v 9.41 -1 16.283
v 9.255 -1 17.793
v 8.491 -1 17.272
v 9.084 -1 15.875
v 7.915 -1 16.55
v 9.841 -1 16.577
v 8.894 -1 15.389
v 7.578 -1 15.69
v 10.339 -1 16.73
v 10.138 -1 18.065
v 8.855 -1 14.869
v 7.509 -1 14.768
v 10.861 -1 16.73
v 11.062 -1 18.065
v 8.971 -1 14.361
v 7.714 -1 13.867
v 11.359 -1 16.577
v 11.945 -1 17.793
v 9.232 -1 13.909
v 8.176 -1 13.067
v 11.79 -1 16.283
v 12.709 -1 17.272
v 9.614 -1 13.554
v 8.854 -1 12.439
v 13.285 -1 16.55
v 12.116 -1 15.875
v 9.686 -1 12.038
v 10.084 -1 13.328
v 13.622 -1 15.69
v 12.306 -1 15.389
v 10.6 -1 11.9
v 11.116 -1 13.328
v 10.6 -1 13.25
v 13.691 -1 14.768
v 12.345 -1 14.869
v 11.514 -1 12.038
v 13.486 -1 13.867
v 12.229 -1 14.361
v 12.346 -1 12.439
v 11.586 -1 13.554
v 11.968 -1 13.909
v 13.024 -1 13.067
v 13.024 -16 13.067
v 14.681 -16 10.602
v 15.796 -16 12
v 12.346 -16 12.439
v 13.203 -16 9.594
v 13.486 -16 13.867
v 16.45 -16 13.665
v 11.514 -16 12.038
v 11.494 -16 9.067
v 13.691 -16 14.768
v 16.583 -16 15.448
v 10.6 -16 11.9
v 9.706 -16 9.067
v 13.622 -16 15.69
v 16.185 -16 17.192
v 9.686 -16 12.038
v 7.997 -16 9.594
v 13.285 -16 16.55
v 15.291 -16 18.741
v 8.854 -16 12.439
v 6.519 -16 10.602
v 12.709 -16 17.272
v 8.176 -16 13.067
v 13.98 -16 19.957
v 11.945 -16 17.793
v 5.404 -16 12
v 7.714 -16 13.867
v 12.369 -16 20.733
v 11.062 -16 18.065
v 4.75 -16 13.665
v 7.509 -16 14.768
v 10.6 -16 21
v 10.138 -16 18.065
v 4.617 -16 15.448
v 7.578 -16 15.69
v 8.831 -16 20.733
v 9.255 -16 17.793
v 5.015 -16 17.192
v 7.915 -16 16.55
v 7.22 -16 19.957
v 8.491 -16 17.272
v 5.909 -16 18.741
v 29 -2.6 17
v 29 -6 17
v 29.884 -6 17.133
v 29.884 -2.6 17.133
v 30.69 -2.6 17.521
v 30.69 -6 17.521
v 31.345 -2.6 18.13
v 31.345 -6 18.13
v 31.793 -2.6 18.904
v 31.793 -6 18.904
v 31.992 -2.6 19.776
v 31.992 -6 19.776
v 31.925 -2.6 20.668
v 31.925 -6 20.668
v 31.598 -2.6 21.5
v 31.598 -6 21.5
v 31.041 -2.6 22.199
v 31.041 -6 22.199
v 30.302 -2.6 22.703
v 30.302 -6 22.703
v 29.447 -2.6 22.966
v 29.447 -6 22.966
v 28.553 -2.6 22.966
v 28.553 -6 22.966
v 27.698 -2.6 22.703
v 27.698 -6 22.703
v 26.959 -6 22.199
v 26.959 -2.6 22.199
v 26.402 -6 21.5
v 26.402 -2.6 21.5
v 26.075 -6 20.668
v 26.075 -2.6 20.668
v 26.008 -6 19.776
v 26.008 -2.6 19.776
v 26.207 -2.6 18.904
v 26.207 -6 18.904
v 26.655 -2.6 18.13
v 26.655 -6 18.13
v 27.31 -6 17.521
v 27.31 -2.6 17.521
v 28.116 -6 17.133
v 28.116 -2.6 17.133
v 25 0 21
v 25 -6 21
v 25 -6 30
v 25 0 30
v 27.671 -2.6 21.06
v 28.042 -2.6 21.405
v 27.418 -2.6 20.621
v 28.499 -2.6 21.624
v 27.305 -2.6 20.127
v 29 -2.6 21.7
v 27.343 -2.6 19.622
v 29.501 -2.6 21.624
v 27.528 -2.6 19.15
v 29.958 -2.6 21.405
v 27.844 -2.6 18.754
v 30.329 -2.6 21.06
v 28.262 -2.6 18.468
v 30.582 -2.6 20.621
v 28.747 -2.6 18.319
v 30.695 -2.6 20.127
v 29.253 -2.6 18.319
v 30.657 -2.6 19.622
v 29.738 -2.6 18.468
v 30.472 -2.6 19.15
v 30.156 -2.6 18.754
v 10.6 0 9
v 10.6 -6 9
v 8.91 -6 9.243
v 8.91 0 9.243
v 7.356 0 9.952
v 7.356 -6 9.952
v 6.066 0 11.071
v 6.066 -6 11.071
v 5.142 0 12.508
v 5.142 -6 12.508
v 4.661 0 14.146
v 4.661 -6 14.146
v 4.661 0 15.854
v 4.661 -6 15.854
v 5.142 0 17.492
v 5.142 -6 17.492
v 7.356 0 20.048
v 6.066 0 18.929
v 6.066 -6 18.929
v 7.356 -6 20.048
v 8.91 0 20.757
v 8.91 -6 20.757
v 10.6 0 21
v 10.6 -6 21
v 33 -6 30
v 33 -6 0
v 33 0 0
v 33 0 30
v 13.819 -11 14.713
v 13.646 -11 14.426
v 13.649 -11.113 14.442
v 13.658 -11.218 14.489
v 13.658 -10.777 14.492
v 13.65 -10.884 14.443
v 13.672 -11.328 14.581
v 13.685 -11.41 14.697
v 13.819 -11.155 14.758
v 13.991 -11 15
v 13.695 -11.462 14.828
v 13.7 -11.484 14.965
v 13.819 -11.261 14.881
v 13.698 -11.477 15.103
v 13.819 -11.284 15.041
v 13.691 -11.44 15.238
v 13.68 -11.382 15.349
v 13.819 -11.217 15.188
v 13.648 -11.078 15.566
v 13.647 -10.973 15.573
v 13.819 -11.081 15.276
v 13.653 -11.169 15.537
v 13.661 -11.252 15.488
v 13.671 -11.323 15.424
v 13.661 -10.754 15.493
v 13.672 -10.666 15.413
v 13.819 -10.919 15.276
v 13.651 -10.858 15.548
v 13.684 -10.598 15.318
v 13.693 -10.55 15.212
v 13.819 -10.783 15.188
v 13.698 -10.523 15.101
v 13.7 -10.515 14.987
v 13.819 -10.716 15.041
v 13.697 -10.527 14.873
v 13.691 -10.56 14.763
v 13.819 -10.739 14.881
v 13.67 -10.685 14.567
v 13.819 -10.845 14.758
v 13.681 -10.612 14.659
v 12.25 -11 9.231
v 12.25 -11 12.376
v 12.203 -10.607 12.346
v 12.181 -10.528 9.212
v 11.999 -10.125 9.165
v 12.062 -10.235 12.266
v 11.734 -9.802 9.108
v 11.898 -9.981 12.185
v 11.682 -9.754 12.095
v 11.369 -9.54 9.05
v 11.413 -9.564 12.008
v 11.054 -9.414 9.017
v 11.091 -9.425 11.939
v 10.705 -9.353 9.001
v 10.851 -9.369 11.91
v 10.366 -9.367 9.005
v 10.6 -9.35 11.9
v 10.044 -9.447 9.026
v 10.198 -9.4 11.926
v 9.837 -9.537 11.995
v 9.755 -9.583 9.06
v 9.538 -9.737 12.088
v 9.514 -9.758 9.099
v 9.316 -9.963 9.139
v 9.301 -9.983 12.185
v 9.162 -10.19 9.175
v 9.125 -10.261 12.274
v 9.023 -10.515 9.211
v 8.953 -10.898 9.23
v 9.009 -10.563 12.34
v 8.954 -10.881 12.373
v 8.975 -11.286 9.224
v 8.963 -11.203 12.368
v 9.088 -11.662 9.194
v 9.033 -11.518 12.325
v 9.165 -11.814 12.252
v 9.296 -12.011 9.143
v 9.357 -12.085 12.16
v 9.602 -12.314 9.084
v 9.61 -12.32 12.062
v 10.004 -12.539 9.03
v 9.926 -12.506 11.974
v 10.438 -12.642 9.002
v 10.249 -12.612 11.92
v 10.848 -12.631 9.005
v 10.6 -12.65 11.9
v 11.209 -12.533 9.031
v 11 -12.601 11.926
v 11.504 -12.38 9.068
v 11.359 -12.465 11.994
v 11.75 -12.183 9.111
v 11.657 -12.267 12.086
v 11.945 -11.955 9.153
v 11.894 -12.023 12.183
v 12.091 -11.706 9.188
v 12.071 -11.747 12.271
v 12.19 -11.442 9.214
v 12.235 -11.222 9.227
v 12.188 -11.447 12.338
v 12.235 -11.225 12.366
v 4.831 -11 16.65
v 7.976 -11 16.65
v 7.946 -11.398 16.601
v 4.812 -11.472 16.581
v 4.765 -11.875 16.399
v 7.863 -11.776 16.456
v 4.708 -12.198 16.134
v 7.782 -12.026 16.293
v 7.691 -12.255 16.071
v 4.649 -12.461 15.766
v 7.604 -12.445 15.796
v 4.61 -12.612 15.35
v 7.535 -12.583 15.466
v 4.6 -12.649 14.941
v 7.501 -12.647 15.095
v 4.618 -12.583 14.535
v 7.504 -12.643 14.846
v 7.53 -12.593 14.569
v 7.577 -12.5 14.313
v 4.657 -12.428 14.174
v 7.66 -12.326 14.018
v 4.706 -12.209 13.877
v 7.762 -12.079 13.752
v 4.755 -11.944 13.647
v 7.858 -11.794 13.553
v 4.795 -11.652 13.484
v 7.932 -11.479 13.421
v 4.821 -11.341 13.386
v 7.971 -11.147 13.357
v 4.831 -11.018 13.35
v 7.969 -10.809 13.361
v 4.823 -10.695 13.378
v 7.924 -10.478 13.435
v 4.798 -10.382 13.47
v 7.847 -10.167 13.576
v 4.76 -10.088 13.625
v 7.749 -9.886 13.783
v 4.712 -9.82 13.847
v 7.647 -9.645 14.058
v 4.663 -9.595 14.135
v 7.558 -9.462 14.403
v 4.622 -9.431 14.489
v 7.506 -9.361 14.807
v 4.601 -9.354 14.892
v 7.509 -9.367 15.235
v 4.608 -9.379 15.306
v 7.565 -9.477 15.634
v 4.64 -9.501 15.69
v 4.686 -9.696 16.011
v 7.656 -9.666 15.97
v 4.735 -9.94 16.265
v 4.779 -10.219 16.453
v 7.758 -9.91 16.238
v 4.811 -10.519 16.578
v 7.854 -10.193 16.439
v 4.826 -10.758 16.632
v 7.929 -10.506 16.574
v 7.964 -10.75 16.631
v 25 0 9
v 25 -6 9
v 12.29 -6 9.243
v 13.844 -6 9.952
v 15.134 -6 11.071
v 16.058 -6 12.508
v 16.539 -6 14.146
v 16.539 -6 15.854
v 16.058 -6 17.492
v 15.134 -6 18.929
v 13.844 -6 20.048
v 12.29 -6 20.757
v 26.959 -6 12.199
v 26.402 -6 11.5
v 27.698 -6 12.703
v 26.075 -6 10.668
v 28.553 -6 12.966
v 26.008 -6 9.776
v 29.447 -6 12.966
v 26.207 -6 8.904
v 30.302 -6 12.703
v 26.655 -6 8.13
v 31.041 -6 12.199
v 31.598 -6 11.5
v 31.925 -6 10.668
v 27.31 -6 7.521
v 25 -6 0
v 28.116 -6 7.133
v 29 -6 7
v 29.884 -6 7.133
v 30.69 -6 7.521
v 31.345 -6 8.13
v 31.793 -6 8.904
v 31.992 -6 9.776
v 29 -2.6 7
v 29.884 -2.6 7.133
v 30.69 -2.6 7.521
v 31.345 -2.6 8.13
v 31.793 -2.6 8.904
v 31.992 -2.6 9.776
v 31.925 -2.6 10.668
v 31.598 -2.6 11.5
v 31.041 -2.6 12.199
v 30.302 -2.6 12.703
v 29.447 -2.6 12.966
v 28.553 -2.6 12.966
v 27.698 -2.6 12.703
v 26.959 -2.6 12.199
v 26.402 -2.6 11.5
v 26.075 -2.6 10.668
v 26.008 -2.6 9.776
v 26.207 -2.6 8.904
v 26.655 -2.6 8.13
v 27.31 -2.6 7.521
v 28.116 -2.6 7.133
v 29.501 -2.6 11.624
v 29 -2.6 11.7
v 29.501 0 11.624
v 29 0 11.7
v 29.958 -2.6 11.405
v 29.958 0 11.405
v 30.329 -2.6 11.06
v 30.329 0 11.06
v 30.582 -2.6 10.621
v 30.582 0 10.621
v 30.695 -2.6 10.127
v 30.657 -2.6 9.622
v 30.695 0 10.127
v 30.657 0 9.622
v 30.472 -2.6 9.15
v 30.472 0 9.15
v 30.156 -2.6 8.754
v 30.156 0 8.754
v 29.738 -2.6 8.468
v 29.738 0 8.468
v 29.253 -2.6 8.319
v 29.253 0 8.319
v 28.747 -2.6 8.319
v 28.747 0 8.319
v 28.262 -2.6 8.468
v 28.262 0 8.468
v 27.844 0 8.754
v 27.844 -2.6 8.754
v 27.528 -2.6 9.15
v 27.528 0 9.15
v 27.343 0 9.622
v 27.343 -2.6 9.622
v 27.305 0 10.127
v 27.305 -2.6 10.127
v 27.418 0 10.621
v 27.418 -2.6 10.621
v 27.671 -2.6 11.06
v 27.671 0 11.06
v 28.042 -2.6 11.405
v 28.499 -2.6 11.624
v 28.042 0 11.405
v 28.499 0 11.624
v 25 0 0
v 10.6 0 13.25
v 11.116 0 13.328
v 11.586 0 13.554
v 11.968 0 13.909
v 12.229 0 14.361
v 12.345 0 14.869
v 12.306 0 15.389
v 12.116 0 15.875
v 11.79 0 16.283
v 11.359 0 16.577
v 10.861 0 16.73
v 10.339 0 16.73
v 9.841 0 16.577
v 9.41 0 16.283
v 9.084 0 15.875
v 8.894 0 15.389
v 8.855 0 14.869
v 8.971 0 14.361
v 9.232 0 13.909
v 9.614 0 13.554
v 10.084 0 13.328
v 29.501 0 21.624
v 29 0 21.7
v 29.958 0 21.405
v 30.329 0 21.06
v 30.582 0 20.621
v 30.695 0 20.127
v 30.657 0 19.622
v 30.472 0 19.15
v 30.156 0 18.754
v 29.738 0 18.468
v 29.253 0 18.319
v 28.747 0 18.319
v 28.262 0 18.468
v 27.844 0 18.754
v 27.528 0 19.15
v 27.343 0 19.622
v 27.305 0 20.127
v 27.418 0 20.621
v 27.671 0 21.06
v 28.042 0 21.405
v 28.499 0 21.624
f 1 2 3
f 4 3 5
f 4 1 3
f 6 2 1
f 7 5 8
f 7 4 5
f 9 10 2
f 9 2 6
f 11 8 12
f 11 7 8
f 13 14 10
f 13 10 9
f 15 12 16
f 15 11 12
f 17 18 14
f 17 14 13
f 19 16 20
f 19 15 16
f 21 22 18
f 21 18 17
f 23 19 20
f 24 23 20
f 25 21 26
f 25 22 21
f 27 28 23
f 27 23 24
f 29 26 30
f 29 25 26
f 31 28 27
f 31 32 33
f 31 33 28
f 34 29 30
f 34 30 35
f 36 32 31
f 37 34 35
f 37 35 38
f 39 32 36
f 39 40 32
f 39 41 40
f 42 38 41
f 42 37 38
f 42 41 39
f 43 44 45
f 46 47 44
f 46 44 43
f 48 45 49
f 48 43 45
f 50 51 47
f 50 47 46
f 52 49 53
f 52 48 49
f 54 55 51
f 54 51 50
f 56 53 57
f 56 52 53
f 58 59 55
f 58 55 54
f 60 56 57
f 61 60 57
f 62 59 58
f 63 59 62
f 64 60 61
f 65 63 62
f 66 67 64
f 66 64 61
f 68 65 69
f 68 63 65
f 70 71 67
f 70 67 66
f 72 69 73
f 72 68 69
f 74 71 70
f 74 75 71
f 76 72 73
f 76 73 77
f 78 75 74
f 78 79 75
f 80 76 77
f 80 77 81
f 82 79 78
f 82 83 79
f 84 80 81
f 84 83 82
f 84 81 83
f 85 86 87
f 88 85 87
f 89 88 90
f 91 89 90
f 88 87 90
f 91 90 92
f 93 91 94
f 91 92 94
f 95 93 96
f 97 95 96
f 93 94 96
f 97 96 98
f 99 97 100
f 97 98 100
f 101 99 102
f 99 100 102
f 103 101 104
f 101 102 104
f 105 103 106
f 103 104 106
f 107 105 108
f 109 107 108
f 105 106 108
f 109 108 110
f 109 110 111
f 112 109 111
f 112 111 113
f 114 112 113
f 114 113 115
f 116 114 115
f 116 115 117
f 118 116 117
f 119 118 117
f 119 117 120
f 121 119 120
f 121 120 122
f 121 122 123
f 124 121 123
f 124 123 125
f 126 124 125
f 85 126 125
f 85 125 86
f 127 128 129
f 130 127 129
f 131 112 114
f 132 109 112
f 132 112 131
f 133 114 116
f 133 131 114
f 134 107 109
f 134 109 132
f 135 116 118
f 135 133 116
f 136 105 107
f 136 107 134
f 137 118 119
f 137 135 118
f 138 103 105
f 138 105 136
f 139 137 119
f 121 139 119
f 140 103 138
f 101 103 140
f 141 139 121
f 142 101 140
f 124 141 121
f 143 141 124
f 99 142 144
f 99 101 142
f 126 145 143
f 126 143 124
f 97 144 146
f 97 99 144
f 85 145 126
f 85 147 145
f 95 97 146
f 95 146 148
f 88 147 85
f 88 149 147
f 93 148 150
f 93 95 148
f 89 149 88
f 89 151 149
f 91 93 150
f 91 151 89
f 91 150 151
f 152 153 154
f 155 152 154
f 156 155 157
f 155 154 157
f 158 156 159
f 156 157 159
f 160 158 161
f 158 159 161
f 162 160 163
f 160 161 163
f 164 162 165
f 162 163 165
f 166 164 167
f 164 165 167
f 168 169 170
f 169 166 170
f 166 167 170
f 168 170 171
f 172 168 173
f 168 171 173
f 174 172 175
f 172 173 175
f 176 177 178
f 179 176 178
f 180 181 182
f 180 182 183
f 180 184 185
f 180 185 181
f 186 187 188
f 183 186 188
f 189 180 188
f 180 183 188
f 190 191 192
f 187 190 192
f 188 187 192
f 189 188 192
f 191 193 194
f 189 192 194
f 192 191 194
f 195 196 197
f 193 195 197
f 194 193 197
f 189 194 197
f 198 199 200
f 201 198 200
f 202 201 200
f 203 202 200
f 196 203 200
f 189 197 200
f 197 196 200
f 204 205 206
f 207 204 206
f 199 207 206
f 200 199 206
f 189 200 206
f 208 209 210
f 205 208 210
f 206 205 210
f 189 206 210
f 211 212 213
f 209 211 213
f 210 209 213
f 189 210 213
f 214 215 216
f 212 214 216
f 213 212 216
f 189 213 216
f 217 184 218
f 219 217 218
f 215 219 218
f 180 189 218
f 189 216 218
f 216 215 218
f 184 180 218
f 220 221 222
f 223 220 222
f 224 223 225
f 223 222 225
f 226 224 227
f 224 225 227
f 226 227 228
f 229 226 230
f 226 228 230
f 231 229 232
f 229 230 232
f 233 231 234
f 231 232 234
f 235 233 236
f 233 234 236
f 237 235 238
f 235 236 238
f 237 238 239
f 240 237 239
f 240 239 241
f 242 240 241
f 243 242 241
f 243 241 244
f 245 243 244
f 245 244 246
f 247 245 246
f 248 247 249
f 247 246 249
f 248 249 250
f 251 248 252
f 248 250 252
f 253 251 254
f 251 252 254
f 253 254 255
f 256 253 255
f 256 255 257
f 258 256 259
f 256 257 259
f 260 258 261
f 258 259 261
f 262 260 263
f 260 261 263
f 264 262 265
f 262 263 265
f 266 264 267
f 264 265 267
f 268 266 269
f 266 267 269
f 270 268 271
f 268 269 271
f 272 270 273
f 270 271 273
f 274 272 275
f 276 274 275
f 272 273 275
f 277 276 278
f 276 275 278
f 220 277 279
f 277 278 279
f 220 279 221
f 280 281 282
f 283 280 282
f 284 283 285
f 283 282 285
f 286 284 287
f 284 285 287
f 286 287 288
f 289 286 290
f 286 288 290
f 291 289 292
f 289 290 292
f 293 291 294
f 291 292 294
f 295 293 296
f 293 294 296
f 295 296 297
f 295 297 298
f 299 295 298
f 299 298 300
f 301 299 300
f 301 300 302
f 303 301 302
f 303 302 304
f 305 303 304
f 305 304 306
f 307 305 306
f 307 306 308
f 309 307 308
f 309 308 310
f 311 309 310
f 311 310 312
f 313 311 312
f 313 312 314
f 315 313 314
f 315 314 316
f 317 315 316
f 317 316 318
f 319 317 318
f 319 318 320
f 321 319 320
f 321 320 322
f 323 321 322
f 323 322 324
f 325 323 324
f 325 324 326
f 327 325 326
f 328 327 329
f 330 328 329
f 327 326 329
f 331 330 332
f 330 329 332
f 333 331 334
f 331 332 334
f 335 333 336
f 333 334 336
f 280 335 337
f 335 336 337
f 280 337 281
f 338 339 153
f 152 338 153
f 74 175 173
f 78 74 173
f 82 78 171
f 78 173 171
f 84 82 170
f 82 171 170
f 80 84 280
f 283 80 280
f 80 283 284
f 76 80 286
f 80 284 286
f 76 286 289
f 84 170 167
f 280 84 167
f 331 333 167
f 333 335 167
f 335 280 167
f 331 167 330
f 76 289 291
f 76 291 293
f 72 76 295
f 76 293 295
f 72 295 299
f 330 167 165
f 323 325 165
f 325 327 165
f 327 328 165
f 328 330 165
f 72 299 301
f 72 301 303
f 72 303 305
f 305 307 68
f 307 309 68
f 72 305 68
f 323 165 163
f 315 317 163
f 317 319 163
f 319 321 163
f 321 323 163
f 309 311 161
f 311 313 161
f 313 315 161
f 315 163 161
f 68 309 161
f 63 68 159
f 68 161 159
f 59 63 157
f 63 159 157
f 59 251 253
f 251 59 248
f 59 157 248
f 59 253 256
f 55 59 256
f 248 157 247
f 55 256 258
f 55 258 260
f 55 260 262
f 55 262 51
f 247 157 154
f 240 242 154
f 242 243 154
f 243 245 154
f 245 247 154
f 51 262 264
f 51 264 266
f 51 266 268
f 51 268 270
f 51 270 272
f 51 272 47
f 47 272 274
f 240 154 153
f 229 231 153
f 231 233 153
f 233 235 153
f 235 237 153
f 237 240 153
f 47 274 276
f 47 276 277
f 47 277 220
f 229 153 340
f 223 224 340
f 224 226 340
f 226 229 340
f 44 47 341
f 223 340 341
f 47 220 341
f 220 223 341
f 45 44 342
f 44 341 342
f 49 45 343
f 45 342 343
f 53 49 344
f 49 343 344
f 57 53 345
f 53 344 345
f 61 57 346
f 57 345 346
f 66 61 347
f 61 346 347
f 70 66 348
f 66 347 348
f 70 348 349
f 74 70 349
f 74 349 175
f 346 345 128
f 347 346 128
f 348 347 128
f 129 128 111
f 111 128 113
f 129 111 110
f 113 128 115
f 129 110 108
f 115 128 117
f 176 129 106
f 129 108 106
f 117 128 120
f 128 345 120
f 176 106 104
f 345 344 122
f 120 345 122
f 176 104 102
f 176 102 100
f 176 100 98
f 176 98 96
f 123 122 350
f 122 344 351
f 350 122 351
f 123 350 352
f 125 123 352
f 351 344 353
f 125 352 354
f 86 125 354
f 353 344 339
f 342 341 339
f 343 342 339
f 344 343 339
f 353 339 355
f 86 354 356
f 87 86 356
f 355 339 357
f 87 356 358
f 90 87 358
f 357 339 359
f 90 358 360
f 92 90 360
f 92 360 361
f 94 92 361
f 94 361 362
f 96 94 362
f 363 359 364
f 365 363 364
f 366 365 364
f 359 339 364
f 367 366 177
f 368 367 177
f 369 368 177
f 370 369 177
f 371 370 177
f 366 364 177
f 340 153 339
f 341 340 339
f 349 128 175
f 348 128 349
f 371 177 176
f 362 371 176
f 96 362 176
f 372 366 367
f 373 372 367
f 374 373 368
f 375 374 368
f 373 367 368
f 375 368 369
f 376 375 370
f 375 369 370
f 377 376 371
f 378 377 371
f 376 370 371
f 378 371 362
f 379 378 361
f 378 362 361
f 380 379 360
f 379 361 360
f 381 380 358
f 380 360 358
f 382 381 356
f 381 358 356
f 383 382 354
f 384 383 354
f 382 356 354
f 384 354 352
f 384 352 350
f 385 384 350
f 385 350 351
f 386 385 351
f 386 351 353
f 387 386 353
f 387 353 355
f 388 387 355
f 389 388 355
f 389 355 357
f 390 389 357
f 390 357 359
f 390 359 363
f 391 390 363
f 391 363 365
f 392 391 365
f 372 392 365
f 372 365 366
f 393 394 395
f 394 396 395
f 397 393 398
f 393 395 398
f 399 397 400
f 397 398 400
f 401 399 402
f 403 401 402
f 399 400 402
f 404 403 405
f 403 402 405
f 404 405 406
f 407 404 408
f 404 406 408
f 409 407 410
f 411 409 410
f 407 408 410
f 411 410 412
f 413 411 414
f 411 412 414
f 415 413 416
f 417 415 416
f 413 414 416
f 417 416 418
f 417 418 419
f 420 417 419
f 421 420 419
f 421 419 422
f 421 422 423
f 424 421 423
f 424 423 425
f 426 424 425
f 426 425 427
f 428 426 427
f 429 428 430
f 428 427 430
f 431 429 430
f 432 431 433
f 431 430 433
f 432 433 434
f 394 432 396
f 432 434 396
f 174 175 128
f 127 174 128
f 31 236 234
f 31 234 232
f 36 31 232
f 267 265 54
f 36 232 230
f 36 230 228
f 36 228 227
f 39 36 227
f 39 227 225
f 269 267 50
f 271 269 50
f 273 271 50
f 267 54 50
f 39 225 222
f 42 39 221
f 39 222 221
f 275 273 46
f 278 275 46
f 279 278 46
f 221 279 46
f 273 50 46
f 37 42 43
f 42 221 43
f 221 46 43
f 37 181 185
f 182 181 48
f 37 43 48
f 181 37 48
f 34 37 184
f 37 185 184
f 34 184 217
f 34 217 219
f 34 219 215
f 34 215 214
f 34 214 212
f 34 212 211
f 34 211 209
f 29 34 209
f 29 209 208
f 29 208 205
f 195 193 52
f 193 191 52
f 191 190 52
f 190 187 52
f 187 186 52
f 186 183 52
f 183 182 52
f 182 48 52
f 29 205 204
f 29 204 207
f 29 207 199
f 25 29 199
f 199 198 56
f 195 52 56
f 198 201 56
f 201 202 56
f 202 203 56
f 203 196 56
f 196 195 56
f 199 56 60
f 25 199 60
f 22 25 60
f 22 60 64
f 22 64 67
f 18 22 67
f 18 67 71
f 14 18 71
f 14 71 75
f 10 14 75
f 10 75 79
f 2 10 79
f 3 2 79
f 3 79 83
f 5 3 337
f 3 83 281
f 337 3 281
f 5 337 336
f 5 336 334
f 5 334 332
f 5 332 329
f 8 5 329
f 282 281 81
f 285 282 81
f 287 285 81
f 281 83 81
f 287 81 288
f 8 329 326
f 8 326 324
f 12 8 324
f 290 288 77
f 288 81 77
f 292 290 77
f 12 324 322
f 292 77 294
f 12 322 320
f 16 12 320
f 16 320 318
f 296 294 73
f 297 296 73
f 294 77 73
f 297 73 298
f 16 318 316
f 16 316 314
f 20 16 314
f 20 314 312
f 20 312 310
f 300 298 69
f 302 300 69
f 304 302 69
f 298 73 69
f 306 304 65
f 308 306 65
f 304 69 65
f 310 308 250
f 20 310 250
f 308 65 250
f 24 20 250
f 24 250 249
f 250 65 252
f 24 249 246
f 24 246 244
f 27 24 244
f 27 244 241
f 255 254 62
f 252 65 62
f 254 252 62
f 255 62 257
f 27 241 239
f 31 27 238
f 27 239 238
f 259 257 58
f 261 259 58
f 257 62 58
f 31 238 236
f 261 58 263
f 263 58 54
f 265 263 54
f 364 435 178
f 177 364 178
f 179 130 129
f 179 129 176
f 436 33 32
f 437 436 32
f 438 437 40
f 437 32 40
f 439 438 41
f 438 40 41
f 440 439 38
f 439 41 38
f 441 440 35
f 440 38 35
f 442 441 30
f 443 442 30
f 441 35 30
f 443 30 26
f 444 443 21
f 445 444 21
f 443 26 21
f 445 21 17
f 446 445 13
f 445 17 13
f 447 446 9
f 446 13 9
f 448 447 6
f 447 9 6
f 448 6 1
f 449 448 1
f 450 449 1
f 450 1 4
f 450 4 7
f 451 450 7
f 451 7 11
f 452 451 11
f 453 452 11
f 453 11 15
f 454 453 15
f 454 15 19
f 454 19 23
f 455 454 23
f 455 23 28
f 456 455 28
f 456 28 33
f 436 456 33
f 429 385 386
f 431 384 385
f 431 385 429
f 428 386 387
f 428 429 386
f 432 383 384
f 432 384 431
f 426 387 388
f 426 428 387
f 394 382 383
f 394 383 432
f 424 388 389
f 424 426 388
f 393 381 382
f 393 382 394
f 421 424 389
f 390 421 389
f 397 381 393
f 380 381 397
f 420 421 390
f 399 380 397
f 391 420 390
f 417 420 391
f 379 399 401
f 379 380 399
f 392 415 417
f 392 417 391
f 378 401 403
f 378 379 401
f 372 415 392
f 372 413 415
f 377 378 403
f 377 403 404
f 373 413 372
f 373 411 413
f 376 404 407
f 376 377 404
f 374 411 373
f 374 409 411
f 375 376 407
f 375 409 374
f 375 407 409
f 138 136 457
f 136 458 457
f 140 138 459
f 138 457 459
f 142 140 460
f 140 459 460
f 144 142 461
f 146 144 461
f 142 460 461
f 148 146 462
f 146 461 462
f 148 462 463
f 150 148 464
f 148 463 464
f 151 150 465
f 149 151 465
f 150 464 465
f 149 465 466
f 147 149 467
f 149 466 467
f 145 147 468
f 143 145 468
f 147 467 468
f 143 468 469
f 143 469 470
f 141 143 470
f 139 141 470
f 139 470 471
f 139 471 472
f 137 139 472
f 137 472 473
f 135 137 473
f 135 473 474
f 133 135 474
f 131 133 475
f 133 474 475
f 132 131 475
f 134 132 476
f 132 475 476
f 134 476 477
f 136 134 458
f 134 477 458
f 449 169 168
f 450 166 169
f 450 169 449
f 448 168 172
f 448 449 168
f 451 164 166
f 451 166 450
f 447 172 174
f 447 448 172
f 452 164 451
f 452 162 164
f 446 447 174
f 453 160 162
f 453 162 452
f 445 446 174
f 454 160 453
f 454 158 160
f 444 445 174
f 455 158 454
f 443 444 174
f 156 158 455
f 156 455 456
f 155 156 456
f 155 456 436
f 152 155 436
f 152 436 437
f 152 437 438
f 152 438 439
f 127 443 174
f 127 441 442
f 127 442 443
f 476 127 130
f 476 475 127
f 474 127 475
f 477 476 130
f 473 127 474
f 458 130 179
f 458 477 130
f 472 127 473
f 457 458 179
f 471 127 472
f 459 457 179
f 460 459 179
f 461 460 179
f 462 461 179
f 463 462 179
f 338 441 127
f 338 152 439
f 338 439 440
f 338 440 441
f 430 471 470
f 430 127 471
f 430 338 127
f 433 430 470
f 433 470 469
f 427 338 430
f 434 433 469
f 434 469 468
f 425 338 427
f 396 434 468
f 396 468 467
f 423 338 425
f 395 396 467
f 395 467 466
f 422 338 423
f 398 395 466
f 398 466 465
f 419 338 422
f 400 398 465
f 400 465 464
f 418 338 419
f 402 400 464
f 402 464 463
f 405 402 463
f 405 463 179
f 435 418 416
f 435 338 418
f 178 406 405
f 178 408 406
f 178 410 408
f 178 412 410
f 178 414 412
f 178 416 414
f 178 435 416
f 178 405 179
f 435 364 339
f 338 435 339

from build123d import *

# Parameters (mm, degrees)
SKETCH_1_W                = 33
SKETCH_1_H                = 6
EXTRUDE_1_DEPTH           = 30
SKETCH_3_R                = 6
EXTRUDE_2_DEPTH           = 10
SKETCH_4_R                = 3.1
CUT_EXTRUDE_1_DEPTH       = 15
SKETCH_5_R                = 1.75
CUT_EXTRUDE_2_DEPTH       = 48.053161424
EXTRUDE_3_REACH           = 49.381
EXTRUDE_3_END_RADIUS      = 6
SKETCH_10_R               = 1
HOLE_WIZARD_M4_7_D        = 3.3
HOLE_WIZARD_M4_7_DEPTH    = 15
HOLE_WIZARD_M4_7_TIP      = 0.991420021
EXTRUDE_4_REACH           = 49.381
EXTRUDE_4_END_RADIUS      = 6
SKETCH_17_R               = 1.5
HOLE_WIZARD_M4_8_D        = 3.3
HOLE_WIZARD_M4_8_DEPTH    = 13
HOLE_WIZARD_M4_8_TIP      = 0.991420021
HOLE_WIZARD_1_D           = 3.4
HOLE_WIZARD_1_CBORE_D     = 6
HOLE_WIZARD_1_CBORE_DEPTH = 3.4
CUT_EXTRUDE_3_DEPTH       = 46.70557955


with BuildPart() as part:
    # 草图1 → 凸台-拉伸1 (new body)
    with BuildSketch(Plane.XY):
        with Locations((16.5, -3)):
            Rectangle(SKETCH_1_W, SKETCH_1_H)
    extrude(amount=EXTRUDE_1_DEPTH)

    # 草图3 → 凸台-拉伸2 (add)
    with BuildSketch(Plane.XZ.offset(6)):
        with Locations(Location((10.6, 15, 0), (0, 0, 90))):
            Circle(SKETCH_3_R)
    extrude(amount=EXTRUDE_2_DEPTH)

    # 草图4 → 切除-拉伸1 (cut)
    with BuildSketch(Plane.XZ.offset(16)):
        with Locations(Location((10.6, 15, 0), (0, 0, 270))):
            Circle(SKETCH_4_R)
    extrude(amount=-CUT_EXTRUDE_1_DEPTH, mode=Mode.SUBTRACT)

    # 草图5 → 切除-拉伸2 (cut, through all)
    with BuildSketch(Plane.XZ.offset(1)):
        with Locations(Location((10.6, 15, 0), (0, 0, 270))):
            Circle(SKETCH_5_R)
    extrude(amount=-CUT_EXTRUDE_2_DEPTH, mode=Mode.SUBTRACT)

    # 凸台-拉伸3: up to this cylinder (the profile starts outside it)
    extrude_3_end = Plane(origin=(10.6, -11, 15), z_dir=(0, 1, 0)) * Cylinder(EXTRUDE_3_END_RADIUS, 111.762, mode=Mode.PRIVATE)
    # 草图10 → 凸台-拉伸3 (add, up to the surface)
    with BuildSketch(Plane.XY, mode=Mode.PRIVATE) as extrude_3_sk1:
        with Locations(Location((10.6, -11, 0), (0, 0, 180))):
            Circle(SKETCH_10_R)
    extrude_3_tool1 = extrude(extrude_3_sk1.sketch, amount=EXTRUDE_3_REACH, mode=Mode.PRIVATE) - extrude_3_end
    add(extrude_3_tool1.solids().sort_by_distance((10.6, -11, 0))[0])

    # M4 螺纹孔7
    with Locations(Plane(origin=(10.6, -11, 0), x_dir=(-1, 0, 0), z_dir=(0, 0, -1))):
        with Locations((0, 0)):
            Hole(HOLE_WIZARD_M4_7_D / 2, depth=HOLE_WIZARD_M4_7_DEPTH)
            with Locations((0, 0, -(HOLE_WIZARD_M4_7_DEPTH + HOLE_WIZARD_M4_7_TIP / 2))):  # 118° drill point
                Cone(0, HOLE_WIZARD_M4_7_D / 2, HOLE_WIZARD_M4_7_TIP, mode=Mode.SUBTRACT)

    # 凸台-拉伸4: up to this cylinder (the profile starts outside it)
    extrude_4_end = Plane(origin=(10.6, -11, 15), z_dir=(0, 1, 0)) * Cylinder(EXTRUDE_4_END_RADIUS, 111.762, mode=Mode.PRIVATE)
    # 草图17 → 凸台-拉伸4 (add, up to the surface)
    with BuildSketch(Plane(origin=(0, 0, 0), x_dir=(0, 0, -1), z_dir=(1, 0, 0)), mode=Mode.PRIVATE) as extrude_4_sk1:
        with Locations(Location((-15, -11, 0), (0, 0, 180))):
            Circle(SKETCH_17_R)
    extrude_4_tool1 = extrude(extrude_4_sk1.sketch, amount=EXTRUDE_4_REACH, mode=Mode.PRIVATE) - extrude_4_end
    add(extrude_4_tool1.solids().sort_by_distance((0, -11, 15))[0])

    # M4 螺纹孔8
    with Locations(Plane(origin=(0, -11, 15), x_dir=(0, 0, -1), z_dir=(-1, 0, 0))):
        with Locations((0, 0)):
            Hole(HOLE_WIZARD_M4_8_D / 2, depth=HOLE_WIZARD_M4_8_DEPTH)
            with Locations((0, 0, -(HOLE_WIZARD_M4_8_DEPTH + HOLE_WIZARD_M4_8_TIP / 2))):  # 118° drill point
                Cone(0, HOLE_WIZARD_M4_8_D / 2, HOLE_WIZARD_M4_8_TIP, mode=Mode.SUBTRACT)

    # 打孔尺寸(%根据)内六角圆柱头螺钉的类型1 (through all)
    with Locations(Plane(origin=(29, -6, 20), x_dir=(0, 0, -1), z_dir=(0, -1, 0))):
        with Locations((0, 0), (10, 0)):
            CounterBoreHole(HOLE_WIZARD_1_D / 2, HOLE_WIZARD_1_CBORE_D / 2, HOLE_WIZARD_1_CBORE_DEPTH)

    # 草图22 → 切除-拉伸3 (cut, through all)
    with BuildSketch(Plane.XZ.offset(6)):
        with BuildLine():
            Line((10.6, 21), (25, 21))
            Line((25, 21), (25, 30))
            Line((25, 30), (0, 30))
            Line((0, 30), (0, 0))
            Line((0, 0), (25, 0))
            Line((25, 0), (25, 9))
            Line((25, 9), (10.6, 9))
            ThreePointArc((10.6, 9), (4.6, 15), (10.6, 21))
        make_face()
    extrude(amount=-CUT_EXTRUDE_3_DEPTH, mode=Mode.SUBTRACT)


solid = part.part
